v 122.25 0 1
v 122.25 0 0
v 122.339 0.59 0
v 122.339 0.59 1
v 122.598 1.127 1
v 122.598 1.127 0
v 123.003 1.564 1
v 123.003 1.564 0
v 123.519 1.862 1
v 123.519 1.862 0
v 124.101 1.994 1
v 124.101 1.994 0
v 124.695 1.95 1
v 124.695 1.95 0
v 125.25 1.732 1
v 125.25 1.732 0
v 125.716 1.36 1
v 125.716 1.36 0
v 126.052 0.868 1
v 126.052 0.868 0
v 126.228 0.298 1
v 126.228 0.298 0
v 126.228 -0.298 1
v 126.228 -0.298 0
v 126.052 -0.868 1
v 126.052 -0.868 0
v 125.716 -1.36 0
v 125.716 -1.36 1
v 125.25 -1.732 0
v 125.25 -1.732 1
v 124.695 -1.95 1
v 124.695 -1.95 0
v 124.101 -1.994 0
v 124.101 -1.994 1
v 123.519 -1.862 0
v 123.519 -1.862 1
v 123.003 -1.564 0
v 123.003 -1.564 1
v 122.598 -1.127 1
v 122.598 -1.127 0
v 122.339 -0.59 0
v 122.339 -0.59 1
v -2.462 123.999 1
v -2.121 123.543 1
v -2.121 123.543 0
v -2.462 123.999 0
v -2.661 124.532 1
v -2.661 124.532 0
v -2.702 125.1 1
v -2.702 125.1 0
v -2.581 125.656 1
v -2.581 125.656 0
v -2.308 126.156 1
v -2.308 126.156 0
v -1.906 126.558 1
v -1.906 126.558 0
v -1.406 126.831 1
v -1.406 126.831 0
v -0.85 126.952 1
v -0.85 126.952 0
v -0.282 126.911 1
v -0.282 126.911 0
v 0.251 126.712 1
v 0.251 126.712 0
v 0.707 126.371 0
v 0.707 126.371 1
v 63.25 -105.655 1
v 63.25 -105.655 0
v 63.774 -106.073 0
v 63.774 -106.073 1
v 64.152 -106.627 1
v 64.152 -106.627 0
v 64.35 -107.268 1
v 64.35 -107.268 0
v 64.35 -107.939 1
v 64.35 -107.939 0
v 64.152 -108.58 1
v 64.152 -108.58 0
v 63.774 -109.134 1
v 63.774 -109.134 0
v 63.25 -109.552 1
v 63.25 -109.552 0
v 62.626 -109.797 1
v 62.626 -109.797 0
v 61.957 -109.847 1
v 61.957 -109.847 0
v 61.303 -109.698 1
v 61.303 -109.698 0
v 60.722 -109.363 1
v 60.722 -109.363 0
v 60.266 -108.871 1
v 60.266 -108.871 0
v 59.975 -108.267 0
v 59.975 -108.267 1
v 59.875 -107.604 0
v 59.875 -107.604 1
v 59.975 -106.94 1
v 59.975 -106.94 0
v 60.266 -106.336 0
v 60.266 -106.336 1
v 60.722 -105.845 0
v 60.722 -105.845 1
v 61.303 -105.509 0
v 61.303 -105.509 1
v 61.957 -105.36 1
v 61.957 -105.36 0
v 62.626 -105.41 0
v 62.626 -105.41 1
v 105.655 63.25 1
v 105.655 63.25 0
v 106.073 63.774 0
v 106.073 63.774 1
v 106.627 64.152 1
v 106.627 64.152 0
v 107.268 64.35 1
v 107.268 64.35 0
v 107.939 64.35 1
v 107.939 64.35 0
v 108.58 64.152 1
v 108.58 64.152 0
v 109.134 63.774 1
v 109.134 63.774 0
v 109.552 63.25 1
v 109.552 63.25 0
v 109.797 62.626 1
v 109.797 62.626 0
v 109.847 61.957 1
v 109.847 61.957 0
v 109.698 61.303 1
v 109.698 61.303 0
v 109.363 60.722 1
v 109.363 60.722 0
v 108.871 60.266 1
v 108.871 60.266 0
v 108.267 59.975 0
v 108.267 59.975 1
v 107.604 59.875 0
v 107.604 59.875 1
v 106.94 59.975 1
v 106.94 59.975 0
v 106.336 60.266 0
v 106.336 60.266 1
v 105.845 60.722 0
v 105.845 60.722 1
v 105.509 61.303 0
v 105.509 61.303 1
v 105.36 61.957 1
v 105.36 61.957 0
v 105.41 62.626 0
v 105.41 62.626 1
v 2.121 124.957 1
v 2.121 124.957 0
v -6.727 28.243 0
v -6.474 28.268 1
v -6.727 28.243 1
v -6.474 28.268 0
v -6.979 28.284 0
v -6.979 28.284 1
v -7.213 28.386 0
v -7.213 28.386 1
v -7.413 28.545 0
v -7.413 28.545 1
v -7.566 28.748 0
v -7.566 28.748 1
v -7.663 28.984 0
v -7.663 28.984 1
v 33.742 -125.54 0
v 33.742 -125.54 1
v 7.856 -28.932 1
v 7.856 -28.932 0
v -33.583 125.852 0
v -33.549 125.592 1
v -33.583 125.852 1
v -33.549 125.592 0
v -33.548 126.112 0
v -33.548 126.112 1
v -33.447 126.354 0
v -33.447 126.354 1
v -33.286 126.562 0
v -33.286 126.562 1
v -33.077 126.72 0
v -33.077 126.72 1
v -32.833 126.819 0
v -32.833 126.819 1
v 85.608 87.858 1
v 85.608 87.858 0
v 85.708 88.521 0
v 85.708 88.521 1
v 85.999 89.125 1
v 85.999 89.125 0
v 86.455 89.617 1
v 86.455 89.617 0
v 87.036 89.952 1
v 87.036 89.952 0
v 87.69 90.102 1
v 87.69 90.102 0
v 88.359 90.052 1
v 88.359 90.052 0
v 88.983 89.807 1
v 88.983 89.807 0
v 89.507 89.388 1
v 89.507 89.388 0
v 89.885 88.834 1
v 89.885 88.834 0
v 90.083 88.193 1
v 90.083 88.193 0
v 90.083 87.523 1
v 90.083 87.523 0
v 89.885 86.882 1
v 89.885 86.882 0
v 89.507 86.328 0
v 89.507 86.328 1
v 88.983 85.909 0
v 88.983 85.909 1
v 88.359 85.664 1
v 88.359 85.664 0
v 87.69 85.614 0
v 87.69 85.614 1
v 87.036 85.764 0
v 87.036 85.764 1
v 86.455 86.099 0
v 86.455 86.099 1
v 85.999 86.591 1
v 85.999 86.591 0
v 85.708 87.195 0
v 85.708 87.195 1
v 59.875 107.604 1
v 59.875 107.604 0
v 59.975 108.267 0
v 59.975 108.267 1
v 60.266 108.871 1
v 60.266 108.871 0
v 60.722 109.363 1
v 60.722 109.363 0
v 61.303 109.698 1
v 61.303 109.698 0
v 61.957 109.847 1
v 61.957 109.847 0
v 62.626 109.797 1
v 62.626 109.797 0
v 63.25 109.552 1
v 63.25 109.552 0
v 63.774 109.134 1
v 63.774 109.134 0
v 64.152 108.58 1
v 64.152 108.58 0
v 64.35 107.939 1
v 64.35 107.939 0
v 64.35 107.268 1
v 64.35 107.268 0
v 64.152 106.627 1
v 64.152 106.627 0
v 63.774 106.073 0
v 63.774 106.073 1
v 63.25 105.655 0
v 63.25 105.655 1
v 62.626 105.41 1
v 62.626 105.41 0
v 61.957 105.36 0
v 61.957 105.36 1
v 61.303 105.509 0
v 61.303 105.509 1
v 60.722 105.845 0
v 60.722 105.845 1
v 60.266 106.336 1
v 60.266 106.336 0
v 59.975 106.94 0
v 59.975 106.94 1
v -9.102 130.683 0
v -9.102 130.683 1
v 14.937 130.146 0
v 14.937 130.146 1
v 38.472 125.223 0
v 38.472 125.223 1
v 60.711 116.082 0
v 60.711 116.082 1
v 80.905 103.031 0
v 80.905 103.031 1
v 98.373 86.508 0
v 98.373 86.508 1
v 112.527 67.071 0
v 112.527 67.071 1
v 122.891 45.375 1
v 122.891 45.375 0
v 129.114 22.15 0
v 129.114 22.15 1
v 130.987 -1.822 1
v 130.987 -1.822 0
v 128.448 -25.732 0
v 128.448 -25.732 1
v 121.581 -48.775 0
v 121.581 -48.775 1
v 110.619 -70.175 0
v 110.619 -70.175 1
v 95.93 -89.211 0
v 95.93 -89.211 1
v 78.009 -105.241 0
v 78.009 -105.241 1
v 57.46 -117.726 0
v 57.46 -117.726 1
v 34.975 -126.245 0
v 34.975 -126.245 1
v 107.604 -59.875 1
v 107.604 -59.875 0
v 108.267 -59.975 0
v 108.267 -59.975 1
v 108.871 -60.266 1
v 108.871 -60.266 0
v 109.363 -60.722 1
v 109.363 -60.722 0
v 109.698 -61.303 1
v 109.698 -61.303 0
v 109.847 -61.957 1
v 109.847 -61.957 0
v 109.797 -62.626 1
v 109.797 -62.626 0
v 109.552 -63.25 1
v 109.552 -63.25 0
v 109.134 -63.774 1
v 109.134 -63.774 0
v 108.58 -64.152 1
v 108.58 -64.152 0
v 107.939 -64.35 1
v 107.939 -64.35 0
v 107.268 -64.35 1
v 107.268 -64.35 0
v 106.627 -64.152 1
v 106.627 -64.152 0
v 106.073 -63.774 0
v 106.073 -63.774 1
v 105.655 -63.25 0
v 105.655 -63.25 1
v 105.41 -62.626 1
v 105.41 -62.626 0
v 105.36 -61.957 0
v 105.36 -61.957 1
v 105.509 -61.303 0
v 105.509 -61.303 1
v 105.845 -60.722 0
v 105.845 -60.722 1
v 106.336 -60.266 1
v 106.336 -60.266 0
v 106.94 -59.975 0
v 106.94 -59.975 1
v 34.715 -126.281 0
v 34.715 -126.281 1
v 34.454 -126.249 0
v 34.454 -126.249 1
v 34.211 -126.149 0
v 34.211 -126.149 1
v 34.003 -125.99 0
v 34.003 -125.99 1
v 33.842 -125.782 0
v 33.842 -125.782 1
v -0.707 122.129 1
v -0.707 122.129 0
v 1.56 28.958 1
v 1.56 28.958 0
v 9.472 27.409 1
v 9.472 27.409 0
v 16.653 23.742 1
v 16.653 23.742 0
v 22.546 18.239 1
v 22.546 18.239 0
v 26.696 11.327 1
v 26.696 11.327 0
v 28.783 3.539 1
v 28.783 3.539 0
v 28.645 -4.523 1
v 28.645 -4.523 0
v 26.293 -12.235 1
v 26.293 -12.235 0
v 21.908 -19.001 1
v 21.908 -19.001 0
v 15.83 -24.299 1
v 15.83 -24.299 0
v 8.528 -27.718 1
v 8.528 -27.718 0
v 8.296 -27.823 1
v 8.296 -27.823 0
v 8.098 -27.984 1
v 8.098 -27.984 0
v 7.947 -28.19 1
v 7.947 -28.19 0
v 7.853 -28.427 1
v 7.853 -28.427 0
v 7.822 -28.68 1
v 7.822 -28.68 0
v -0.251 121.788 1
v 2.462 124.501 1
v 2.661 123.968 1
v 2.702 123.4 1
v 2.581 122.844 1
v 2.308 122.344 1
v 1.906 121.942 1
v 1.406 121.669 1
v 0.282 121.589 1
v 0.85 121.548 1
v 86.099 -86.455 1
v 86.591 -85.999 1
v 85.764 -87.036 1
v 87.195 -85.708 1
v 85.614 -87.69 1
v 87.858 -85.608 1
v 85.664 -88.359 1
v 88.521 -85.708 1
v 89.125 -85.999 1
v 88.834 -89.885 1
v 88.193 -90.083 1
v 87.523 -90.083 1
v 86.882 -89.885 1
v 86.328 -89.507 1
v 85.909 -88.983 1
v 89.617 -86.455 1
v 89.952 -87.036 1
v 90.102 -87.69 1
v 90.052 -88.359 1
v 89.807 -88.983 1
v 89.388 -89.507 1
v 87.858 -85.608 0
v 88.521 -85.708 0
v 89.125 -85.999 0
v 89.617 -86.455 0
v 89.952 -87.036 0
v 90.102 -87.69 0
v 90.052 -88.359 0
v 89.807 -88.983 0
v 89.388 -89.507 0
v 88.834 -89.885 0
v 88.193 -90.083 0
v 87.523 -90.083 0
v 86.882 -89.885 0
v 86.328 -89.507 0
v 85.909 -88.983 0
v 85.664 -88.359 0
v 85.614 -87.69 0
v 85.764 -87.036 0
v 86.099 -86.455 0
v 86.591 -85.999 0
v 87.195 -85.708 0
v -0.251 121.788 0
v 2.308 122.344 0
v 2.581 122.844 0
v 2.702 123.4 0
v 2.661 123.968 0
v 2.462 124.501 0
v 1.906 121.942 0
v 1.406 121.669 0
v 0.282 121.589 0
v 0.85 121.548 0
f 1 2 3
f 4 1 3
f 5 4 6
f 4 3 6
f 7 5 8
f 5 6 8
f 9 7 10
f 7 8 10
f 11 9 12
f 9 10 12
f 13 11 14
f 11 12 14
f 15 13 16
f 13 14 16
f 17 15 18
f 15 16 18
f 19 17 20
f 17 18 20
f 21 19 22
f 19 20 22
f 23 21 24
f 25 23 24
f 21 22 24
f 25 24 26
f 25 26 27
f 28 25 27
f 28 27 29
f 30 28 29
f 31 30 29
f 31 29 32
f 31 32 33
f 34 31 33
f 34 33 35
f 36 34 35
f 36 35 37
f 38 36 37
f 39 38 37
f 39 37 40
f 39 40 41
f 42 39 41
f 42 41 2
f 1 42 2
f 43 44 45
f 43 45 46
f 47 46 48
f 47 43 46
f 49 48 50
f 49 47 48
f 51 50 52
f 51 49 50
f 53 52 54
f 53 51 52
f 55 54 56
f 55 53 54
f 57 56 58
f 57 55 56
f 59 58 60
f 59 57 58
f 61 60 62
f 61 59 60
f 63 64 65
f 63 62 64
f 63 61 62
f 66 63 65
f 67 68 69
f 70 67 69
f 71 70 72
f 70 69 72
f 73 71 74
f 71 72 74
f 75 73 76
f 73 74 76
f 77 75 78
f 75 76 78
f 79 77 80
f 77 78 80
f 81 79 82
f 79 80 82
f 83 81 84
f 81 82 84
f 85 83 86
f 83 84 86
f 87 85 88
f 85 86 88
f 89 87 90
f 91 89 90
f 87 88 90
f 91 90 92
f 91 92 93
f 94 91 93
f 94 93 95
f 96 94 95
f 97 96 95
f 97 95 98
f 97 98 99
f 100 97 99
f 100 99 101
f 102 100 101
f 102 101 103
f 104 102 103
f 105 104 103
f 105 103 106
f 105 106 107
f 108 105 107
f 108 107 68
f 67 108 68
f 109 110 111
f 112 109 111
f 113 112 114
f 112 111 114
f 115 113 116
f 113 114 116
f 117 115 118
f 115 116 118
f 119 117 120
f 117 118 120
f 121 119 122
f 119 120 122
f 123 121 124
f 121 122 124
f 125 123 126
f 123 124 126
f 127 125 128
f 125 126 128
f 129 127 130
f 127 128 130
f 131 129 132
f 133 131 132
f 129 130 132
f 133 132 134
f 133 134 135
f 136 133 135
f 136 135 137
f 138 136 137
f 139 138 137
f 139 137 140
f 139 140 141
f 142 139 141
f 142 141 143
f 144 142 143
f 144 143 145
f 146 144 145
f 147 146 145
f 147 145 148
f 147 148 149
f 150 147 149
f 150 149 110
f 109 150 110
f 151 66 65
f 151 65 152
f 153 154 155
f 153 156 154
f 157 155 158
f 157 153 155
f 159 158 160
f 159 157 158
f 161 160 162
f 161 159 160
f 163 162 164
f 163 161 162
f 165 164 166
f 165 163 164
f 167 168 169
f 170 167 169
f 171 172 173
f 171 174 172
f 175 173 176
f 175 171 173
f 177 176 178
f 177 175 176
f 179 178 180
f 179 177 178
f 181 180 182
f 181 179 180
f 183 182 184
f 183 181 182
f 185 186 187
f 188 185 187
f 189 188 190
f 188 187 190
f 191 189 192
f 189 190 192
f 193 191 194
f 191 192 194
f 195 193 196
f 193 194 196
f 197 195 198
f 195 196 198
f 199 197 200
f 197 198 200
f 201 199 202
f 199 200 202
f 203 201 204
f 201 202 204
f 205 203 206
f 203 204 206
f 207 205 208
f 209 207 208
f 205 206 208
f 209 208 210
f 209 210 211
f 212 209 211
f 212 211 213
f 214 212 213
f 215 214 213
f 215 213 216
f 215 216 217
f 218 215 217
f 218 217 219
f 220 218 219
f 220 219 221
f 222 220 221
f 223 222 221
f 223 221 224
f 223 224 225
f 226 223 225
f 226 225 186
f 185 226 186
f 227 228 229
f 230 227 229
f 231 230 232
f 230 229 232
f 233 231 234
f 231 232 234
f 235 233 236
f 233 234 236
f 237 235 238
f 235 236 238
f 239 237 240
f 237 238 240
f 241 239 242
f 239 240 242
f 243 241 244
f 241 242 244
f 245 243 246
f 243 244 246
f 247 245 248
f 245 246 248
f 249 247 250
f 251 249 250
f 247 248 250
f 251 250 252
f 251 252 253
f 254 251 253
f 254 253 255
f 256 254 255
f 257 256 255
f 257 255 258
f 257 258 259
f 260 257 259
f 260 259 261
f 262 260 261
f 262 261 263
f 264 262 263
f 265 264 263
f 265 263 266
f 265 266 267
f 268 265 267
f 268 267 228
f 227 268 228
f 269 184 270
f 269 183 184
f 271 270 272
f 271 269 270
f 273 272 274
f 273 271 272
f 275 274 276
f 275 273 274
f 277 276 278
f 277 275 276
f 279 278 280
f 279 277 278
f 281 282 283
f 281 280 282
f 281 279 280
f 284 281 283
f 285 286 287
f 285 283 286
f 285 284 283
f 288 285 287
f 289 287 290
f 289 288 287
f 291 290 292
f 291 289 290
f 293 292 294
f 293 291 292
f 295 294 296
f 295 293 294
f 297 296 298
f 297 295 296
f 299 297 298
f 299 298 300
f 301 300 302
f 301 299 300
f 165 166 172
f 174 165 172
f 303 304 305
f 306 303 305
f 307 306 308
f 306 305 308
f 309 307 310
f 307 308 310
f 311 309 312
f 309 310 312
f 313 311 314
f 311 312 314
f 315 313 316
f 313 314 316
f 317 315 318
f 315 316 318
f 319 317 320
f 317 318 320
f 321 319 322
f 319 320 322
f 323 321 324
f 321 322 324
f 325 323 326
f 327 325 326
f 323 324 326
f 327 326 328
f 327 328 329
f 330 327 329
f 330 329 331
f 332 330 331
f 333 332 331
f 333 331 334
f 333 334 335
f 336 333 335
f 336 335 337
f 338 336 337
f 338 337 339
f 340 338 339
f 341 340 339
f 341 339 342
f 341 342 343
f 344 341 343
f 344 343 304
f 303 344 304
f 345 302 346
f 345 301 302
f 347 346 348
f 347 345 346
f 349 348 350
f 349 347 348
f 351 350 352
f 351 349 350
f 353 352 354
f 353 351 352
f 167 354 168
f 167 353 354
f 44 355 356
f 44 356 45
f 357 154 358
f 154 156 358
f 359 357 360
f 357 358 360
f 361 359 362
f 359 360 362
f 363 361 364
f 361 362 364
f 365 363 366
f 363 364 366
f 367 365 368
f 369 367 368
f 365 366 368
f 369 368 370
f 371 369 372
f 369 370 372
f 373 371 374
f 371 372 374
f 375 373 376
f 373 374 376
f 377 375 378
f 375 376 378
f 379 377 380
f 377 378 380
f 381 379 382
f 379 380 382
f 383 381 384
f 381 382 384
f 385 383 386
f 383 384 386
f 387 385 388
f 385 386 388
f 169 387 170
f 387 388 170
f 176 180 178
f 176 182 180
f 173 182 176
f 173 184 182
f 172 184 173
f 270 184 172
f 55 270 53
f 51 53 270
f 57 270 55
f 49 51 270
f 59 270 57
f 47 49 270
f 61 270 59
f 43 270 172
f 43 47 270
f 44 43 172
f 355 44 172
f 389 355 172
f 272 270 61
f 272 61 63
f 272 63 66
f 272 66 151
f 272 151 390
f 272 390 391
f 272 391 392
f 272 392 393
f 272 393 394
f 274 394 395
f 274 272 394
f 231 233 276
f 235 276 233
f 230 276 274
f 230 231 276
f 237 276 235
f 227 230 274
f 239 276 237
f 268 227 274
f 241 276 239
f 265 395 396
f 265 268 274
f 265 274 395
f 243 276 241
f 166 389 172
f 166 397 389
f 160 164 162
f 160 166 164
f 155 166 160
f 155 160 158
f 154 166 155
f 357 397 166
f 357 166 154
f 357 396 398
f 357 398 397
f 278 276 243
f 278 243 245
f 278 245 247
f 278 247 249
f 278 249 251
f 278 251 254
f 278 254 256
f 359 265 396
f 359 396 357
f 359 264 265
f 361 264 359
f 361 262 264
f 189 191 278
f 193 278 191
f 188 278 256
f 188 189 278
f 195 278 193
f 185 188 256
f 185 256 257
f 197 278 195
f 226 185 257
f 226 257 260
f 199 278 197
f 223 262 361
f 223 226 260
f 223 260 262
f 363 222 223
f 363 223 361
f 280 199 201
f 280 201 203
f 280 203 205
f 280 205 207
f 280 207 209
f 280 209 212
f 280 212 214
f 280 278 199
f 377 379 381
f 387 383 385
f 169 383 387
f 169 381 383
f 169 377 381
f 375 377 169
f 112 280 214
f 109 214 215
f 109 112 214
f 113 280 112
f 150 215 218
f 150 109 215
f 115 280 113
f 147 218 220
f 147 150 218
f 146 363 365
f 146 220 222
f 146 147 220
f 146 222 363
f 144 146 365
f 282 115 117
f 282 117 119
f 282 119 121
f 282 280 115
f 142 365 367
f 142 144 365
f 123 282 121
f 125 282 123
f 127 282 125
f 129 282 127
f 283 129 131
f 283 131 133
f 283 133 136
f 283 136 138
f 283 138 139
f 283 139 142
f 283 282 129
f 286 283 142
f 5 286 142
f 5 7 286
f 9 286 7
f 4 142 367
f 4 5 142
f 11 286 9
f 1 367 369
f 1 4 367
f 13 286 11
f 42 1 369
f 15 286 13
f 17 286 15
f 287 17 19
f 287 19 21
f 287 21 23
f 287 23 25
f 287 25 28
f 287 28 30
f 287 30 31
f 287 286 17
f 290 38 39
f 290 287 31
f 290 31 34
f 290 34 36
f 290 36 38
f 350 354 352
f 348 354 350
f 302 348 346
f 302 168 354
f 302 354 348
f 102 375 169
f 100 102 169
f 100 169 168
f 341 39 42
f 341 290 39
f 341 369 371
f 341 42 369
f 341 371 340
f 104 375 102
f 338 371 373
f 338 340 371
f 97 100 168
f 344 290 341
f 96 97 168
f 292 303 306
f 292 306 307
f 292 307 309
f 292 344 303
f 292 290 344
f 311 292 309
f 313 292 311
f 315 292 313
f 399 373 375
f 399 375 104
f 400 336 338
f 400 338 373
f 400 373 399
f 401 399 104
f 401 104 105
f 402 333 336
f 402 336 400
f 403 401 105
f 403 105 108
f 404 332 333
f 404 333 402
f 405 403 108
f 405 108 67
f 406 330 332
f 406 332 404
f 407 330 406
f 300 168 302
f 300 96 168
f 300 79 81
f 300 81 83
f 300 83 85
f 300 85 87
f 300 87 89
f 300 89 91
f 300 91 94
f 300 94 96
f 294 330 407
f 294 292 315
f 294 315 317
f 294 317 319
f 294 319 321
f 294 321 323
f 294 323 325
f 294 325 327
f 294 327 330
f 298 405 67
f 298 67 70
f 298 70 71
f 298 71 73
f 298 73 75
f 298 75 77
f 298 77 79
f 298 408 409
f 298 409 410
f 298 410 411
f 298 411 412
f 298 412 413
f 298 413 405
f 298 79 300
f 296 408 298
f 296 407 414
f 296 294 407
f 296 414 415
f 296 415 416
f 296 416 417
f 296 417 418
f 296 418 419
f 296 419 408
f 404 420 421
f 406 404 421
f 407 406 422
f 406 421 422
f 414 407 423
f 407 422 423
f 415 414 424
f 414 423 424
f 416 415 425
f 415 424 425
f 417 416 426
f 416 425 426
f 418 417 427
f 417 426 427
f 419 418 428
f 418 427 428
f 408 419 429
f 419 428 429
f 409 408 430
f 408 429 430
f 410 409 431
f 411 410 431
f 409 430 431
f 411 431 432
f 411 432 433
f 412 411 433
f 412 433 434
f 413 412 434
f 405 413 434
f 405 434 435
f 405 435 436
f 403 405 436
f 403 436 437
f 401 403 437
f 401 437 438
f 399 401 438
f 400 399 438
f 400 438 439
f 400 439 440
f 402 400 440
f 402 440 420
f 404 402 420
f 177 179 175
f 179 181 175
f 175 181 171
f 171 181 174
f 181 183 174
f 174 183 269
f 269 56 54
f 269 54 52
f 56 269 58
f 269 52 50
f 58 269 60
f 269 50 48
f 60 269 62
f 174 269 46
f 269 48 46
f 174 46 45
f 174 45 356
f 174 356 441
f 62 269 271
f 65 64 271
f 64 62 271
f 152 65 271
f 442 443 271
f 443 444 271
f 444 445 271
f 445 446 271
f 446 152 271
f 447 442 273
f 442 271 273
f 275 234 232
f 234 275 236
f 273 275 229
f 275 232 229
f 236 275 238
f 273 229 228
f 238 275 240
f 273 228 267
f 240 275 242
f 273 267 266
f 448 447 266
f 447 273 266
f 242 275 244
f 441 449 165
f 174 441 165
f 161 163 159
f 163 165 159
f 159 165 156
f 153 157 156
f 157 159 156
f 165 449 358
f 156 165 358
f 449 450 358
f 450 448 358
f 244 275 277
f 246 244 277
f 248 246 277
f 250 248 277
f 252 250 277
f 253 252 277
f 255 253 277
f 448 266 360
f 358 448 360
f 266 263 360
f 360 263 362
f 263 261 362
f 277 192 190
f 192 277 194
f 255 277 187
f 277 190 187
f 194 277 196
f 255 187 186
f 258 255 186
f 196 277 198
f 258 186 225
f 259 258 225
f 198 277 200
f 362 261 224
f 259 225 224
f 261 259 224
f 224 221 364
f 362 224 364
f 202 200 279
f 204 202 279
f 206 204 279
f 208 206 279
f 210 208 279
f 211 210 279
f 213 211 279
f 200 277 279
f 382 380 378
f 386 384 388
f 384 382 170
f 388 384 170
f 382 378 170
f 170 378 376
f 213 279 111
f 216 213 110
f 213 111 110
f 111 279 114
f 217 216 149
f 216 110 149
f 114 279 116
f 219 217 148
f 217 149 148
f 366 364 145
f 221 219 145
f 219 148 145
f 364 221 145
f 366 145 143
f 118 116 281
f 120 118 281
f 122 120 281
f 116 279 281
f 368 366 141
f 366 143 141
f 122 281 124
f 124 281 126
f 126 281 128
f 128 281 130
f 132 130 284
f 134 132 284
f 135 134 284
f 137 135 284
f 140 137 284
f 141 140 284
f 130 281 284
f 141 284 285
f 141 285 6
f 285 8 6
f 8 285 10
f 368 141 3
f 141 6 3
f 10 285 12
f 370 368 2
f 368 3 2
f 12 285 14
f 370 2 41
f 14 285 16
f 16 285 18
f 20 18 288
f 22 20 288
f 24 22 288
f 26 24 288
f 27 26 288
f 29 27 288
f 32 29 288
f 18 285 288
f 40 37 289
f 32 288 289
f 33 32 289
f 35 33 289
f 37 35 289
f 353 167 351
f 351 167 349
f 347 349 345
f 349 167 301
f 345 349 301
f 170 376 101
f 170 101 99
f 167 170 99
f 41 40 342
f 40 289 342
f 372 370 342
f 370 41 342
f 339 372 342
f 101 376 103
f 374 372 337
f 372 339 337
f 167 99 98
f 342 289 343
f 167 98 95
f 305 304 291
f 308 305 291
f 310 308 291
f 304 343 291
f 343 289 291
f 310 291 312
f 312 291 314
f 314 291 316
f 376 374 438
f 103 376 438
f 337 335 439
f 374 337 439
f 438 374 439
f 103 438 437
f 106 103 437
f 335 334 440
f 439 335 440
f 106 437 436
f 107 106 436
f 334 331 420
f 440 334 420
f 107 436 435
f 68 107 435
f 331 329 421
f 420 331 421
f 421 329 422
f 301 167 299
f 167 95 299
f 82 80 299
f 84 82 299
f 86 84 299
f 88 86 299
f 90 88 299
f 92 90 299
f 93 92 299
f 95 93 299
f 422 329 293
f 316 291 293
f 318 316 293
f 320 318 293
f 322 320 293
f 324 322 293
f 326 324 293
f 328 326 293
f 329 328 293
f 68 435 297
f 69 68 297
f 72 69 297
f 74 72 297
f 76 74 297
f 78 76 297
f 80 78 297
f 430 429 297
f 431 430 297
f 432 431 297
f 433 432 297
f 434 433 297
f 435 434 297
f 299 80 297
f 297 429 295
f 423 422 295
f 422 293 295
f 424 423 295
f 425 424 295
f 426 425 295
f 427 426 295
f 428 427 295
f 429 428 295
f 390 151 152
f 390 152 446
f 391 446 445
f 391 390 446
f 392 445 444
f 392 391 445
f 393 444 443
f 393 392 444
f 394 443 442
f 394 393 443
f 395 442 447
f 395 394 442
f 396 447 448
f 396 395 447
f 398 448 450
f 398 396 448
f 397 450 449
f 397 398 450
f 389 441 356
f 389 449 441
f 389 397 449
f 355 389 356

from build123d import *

# Parameters (mm, degrees)
SKETCH1_W                     = 1
SKETCH1_H                     = 102
REVOLVE_THIN1_ANGLE           = 15
REVOLVE_THIN1_OTHER_WAY_ANGLE = 165
F_4_5_4_5_DIAMETER_HOLE1_D    = 4.5
CIRPATTERN1_COUNT             = 12
F_4_0_4_DIAMETER_HOLE1_D      = 4
CIRPATTERN2_COUNT             = 4
F_4_5_4_5_DIAMETER_HOLE2_D    = 4.5
CIRPATTERN3_COUNT             = 2
CIRPATTERN3_ANGLE             = 90
CUT_EXTRUDE1_DEPTH            = 2
CUT_EXTRUDE2_DEPTH            = 2
FILLET1_R                     = 1


with BuildPart() as part:
    # Sketch1 → Revolve-Thin1 (revolve)
    with BuildSketch(Plane(origin=(0, 0, 0), x_dir=(0, 0, -1), z_dir=(1, 0, 0))):
        with Locations((-0.5, 80)):
            Rectangle(SKETCH1_W, SKETCH1_H)
    revolve(axis=Axis((0, 0, 0), (0, 0, 1)), revolution_arc=REVOLVE_THIN1_ANGLE)

    # Sketch1 → Revolve-Thin1 other way (revolve)
    with BuildSketch(Plane(origin=(0, 0, 0), x_dir=(0, 0, -1), z_dir=(1, 0, 0))):
        with Locations((-0.5, 80)):
            Rectangle(SKETCH1_W, SKETCH1_H)
    revolve(axis=Axis((0, 0, 0), (0, 0, -1)), revolution_arc=REVOLVE_THIN1_OTHER_WAY_ANGLE)

    # Ø4.5 (4.5) Diameter Hole1 (through all)
    with Locations(Plane.XY.offset(1)):
        with Locations((62.125, 107.60365642)):
            f_4_5_4_5_diameter_hole1 = Hole(F_4_5_4_5_DIAMETER_HOLE1_D / 2)

    # CirPattern1: Ø4.5 (4.5) Diameter Hole1 ×12 about axis, 8 skipped
    cirpattern1_axis = Axis((0, 0, -80.9), (0, 0, 1))
    add([f_4_5_4_5_diameter_hole1.rotate(cirpattern1_axis, i * 360 / CIRPATTERN1_COUNT) for i in range(1, CIRPATTERN1_COUNT) if i not in (1, 2, 3, 4, 5, 6, 7, 10)], mode=Mode.SUBTRACT)

    # Ø4.0 (4) Diameter Hole1 (through all)
    with Locations(Plane.XY.offset(1)):
        with Locations((124.25, 0)):
            f_4_0_4_diameter_hole1 = Hole(F_4_0_4_DIAMETER_HOLE1_D / 2)

    # CirPattern2: Ø4.0 (4) Diameter Hole1 ×4 about axis, 2 skipped
    cirpattern2_axis = Axis((0, 0, -80.9), (0, 0, 1))
    add([f_4_0_4_diameter_hole1.rotate(cirpattern2_axis, i * 360 / CIRPATTERN2_COUNT) for i in range(1, CIRPATTERN2_COUNT) if i not in (2, 3)], mode=Mode.SUBTRACT)

    # Ø4.5 (4.5) Diameter Hole2 (through all)
    with Locations(Plane.XY.offset(1)):
        with Locations((87.858017562, 87.858017562)):
            f_4_5_4_5_diameter_hole2 = Hole(F_4_5_4_5_DIAMETER_HOLE2_D / 2)

    # CirPattern3: Ø4.5 (4.5) Diameter Hole2 ×2 about axis
    cirpattern3_axis = Axis((0, 0, -80.9), (0, 0, -1))
    for i in range(1, CIRPATTERN3_COUNT):
        add(f_4_5_4_5_diameter_hole2.rotate(cirpattern3_axis, i * CIRPATTERN3_ANGLE / (CIRPATTERN3_COUNT - 1)), mode=Mode.SUBTRACT)

    # Sketch12 → Cut-Extrude1 (cut, through all)
    with BuildSketch(Plane.XY.offset(1)):
        with BuildLine():
            Line((0.707106781, 126.371320344), (2.121320344, 124.957106781))
            ThreePointArc((2.121320344, 124.957106781), (2.121320344, 122.128679656), (-0.707106781, 122.128679656))
            Line((-0.707106781, 122.128679656), (-2.121320344, 123.542893219))
            ThreePointArc((-2.121320344, 123.542893219), (-2.121320344, 126.371320344), (0.707106781, 126.371320344))
        make_face()
    extrude(amount=-CUT_EXTRUDE1_DEPTH, mode=Mode.SUBTRACT)

    # Sketch13 → Cut-Extrude2 (cut, through all)
    with BuildSketch(Plane.XY.offset(1)):
        Polygon((-33.905294908, 126.536283244), (33.905294908, -126.536283244), (34.001887491, -126.510401339), (-33.808702326, 126.562165148), align=None)
    extrude(amount=-CUT_EXTRUDE2_DEPTH, mode=Mode.SUBTRACT)

    # Fillet1
    fillet1_edges = [part.edges().sort_by_distance(p)[0] for p in [
        (-7.409115101, 28.037564327, 0.5),
        (7.602300266, -27.985800518, 0.5),
        (34.001877612, -126.510364472, 0.5),
        (-33.808692447, 126.562128281, 0.5),
    ]]
    fillet(fillet1_edges, radius=FILLET1_R)


solid = part.part
